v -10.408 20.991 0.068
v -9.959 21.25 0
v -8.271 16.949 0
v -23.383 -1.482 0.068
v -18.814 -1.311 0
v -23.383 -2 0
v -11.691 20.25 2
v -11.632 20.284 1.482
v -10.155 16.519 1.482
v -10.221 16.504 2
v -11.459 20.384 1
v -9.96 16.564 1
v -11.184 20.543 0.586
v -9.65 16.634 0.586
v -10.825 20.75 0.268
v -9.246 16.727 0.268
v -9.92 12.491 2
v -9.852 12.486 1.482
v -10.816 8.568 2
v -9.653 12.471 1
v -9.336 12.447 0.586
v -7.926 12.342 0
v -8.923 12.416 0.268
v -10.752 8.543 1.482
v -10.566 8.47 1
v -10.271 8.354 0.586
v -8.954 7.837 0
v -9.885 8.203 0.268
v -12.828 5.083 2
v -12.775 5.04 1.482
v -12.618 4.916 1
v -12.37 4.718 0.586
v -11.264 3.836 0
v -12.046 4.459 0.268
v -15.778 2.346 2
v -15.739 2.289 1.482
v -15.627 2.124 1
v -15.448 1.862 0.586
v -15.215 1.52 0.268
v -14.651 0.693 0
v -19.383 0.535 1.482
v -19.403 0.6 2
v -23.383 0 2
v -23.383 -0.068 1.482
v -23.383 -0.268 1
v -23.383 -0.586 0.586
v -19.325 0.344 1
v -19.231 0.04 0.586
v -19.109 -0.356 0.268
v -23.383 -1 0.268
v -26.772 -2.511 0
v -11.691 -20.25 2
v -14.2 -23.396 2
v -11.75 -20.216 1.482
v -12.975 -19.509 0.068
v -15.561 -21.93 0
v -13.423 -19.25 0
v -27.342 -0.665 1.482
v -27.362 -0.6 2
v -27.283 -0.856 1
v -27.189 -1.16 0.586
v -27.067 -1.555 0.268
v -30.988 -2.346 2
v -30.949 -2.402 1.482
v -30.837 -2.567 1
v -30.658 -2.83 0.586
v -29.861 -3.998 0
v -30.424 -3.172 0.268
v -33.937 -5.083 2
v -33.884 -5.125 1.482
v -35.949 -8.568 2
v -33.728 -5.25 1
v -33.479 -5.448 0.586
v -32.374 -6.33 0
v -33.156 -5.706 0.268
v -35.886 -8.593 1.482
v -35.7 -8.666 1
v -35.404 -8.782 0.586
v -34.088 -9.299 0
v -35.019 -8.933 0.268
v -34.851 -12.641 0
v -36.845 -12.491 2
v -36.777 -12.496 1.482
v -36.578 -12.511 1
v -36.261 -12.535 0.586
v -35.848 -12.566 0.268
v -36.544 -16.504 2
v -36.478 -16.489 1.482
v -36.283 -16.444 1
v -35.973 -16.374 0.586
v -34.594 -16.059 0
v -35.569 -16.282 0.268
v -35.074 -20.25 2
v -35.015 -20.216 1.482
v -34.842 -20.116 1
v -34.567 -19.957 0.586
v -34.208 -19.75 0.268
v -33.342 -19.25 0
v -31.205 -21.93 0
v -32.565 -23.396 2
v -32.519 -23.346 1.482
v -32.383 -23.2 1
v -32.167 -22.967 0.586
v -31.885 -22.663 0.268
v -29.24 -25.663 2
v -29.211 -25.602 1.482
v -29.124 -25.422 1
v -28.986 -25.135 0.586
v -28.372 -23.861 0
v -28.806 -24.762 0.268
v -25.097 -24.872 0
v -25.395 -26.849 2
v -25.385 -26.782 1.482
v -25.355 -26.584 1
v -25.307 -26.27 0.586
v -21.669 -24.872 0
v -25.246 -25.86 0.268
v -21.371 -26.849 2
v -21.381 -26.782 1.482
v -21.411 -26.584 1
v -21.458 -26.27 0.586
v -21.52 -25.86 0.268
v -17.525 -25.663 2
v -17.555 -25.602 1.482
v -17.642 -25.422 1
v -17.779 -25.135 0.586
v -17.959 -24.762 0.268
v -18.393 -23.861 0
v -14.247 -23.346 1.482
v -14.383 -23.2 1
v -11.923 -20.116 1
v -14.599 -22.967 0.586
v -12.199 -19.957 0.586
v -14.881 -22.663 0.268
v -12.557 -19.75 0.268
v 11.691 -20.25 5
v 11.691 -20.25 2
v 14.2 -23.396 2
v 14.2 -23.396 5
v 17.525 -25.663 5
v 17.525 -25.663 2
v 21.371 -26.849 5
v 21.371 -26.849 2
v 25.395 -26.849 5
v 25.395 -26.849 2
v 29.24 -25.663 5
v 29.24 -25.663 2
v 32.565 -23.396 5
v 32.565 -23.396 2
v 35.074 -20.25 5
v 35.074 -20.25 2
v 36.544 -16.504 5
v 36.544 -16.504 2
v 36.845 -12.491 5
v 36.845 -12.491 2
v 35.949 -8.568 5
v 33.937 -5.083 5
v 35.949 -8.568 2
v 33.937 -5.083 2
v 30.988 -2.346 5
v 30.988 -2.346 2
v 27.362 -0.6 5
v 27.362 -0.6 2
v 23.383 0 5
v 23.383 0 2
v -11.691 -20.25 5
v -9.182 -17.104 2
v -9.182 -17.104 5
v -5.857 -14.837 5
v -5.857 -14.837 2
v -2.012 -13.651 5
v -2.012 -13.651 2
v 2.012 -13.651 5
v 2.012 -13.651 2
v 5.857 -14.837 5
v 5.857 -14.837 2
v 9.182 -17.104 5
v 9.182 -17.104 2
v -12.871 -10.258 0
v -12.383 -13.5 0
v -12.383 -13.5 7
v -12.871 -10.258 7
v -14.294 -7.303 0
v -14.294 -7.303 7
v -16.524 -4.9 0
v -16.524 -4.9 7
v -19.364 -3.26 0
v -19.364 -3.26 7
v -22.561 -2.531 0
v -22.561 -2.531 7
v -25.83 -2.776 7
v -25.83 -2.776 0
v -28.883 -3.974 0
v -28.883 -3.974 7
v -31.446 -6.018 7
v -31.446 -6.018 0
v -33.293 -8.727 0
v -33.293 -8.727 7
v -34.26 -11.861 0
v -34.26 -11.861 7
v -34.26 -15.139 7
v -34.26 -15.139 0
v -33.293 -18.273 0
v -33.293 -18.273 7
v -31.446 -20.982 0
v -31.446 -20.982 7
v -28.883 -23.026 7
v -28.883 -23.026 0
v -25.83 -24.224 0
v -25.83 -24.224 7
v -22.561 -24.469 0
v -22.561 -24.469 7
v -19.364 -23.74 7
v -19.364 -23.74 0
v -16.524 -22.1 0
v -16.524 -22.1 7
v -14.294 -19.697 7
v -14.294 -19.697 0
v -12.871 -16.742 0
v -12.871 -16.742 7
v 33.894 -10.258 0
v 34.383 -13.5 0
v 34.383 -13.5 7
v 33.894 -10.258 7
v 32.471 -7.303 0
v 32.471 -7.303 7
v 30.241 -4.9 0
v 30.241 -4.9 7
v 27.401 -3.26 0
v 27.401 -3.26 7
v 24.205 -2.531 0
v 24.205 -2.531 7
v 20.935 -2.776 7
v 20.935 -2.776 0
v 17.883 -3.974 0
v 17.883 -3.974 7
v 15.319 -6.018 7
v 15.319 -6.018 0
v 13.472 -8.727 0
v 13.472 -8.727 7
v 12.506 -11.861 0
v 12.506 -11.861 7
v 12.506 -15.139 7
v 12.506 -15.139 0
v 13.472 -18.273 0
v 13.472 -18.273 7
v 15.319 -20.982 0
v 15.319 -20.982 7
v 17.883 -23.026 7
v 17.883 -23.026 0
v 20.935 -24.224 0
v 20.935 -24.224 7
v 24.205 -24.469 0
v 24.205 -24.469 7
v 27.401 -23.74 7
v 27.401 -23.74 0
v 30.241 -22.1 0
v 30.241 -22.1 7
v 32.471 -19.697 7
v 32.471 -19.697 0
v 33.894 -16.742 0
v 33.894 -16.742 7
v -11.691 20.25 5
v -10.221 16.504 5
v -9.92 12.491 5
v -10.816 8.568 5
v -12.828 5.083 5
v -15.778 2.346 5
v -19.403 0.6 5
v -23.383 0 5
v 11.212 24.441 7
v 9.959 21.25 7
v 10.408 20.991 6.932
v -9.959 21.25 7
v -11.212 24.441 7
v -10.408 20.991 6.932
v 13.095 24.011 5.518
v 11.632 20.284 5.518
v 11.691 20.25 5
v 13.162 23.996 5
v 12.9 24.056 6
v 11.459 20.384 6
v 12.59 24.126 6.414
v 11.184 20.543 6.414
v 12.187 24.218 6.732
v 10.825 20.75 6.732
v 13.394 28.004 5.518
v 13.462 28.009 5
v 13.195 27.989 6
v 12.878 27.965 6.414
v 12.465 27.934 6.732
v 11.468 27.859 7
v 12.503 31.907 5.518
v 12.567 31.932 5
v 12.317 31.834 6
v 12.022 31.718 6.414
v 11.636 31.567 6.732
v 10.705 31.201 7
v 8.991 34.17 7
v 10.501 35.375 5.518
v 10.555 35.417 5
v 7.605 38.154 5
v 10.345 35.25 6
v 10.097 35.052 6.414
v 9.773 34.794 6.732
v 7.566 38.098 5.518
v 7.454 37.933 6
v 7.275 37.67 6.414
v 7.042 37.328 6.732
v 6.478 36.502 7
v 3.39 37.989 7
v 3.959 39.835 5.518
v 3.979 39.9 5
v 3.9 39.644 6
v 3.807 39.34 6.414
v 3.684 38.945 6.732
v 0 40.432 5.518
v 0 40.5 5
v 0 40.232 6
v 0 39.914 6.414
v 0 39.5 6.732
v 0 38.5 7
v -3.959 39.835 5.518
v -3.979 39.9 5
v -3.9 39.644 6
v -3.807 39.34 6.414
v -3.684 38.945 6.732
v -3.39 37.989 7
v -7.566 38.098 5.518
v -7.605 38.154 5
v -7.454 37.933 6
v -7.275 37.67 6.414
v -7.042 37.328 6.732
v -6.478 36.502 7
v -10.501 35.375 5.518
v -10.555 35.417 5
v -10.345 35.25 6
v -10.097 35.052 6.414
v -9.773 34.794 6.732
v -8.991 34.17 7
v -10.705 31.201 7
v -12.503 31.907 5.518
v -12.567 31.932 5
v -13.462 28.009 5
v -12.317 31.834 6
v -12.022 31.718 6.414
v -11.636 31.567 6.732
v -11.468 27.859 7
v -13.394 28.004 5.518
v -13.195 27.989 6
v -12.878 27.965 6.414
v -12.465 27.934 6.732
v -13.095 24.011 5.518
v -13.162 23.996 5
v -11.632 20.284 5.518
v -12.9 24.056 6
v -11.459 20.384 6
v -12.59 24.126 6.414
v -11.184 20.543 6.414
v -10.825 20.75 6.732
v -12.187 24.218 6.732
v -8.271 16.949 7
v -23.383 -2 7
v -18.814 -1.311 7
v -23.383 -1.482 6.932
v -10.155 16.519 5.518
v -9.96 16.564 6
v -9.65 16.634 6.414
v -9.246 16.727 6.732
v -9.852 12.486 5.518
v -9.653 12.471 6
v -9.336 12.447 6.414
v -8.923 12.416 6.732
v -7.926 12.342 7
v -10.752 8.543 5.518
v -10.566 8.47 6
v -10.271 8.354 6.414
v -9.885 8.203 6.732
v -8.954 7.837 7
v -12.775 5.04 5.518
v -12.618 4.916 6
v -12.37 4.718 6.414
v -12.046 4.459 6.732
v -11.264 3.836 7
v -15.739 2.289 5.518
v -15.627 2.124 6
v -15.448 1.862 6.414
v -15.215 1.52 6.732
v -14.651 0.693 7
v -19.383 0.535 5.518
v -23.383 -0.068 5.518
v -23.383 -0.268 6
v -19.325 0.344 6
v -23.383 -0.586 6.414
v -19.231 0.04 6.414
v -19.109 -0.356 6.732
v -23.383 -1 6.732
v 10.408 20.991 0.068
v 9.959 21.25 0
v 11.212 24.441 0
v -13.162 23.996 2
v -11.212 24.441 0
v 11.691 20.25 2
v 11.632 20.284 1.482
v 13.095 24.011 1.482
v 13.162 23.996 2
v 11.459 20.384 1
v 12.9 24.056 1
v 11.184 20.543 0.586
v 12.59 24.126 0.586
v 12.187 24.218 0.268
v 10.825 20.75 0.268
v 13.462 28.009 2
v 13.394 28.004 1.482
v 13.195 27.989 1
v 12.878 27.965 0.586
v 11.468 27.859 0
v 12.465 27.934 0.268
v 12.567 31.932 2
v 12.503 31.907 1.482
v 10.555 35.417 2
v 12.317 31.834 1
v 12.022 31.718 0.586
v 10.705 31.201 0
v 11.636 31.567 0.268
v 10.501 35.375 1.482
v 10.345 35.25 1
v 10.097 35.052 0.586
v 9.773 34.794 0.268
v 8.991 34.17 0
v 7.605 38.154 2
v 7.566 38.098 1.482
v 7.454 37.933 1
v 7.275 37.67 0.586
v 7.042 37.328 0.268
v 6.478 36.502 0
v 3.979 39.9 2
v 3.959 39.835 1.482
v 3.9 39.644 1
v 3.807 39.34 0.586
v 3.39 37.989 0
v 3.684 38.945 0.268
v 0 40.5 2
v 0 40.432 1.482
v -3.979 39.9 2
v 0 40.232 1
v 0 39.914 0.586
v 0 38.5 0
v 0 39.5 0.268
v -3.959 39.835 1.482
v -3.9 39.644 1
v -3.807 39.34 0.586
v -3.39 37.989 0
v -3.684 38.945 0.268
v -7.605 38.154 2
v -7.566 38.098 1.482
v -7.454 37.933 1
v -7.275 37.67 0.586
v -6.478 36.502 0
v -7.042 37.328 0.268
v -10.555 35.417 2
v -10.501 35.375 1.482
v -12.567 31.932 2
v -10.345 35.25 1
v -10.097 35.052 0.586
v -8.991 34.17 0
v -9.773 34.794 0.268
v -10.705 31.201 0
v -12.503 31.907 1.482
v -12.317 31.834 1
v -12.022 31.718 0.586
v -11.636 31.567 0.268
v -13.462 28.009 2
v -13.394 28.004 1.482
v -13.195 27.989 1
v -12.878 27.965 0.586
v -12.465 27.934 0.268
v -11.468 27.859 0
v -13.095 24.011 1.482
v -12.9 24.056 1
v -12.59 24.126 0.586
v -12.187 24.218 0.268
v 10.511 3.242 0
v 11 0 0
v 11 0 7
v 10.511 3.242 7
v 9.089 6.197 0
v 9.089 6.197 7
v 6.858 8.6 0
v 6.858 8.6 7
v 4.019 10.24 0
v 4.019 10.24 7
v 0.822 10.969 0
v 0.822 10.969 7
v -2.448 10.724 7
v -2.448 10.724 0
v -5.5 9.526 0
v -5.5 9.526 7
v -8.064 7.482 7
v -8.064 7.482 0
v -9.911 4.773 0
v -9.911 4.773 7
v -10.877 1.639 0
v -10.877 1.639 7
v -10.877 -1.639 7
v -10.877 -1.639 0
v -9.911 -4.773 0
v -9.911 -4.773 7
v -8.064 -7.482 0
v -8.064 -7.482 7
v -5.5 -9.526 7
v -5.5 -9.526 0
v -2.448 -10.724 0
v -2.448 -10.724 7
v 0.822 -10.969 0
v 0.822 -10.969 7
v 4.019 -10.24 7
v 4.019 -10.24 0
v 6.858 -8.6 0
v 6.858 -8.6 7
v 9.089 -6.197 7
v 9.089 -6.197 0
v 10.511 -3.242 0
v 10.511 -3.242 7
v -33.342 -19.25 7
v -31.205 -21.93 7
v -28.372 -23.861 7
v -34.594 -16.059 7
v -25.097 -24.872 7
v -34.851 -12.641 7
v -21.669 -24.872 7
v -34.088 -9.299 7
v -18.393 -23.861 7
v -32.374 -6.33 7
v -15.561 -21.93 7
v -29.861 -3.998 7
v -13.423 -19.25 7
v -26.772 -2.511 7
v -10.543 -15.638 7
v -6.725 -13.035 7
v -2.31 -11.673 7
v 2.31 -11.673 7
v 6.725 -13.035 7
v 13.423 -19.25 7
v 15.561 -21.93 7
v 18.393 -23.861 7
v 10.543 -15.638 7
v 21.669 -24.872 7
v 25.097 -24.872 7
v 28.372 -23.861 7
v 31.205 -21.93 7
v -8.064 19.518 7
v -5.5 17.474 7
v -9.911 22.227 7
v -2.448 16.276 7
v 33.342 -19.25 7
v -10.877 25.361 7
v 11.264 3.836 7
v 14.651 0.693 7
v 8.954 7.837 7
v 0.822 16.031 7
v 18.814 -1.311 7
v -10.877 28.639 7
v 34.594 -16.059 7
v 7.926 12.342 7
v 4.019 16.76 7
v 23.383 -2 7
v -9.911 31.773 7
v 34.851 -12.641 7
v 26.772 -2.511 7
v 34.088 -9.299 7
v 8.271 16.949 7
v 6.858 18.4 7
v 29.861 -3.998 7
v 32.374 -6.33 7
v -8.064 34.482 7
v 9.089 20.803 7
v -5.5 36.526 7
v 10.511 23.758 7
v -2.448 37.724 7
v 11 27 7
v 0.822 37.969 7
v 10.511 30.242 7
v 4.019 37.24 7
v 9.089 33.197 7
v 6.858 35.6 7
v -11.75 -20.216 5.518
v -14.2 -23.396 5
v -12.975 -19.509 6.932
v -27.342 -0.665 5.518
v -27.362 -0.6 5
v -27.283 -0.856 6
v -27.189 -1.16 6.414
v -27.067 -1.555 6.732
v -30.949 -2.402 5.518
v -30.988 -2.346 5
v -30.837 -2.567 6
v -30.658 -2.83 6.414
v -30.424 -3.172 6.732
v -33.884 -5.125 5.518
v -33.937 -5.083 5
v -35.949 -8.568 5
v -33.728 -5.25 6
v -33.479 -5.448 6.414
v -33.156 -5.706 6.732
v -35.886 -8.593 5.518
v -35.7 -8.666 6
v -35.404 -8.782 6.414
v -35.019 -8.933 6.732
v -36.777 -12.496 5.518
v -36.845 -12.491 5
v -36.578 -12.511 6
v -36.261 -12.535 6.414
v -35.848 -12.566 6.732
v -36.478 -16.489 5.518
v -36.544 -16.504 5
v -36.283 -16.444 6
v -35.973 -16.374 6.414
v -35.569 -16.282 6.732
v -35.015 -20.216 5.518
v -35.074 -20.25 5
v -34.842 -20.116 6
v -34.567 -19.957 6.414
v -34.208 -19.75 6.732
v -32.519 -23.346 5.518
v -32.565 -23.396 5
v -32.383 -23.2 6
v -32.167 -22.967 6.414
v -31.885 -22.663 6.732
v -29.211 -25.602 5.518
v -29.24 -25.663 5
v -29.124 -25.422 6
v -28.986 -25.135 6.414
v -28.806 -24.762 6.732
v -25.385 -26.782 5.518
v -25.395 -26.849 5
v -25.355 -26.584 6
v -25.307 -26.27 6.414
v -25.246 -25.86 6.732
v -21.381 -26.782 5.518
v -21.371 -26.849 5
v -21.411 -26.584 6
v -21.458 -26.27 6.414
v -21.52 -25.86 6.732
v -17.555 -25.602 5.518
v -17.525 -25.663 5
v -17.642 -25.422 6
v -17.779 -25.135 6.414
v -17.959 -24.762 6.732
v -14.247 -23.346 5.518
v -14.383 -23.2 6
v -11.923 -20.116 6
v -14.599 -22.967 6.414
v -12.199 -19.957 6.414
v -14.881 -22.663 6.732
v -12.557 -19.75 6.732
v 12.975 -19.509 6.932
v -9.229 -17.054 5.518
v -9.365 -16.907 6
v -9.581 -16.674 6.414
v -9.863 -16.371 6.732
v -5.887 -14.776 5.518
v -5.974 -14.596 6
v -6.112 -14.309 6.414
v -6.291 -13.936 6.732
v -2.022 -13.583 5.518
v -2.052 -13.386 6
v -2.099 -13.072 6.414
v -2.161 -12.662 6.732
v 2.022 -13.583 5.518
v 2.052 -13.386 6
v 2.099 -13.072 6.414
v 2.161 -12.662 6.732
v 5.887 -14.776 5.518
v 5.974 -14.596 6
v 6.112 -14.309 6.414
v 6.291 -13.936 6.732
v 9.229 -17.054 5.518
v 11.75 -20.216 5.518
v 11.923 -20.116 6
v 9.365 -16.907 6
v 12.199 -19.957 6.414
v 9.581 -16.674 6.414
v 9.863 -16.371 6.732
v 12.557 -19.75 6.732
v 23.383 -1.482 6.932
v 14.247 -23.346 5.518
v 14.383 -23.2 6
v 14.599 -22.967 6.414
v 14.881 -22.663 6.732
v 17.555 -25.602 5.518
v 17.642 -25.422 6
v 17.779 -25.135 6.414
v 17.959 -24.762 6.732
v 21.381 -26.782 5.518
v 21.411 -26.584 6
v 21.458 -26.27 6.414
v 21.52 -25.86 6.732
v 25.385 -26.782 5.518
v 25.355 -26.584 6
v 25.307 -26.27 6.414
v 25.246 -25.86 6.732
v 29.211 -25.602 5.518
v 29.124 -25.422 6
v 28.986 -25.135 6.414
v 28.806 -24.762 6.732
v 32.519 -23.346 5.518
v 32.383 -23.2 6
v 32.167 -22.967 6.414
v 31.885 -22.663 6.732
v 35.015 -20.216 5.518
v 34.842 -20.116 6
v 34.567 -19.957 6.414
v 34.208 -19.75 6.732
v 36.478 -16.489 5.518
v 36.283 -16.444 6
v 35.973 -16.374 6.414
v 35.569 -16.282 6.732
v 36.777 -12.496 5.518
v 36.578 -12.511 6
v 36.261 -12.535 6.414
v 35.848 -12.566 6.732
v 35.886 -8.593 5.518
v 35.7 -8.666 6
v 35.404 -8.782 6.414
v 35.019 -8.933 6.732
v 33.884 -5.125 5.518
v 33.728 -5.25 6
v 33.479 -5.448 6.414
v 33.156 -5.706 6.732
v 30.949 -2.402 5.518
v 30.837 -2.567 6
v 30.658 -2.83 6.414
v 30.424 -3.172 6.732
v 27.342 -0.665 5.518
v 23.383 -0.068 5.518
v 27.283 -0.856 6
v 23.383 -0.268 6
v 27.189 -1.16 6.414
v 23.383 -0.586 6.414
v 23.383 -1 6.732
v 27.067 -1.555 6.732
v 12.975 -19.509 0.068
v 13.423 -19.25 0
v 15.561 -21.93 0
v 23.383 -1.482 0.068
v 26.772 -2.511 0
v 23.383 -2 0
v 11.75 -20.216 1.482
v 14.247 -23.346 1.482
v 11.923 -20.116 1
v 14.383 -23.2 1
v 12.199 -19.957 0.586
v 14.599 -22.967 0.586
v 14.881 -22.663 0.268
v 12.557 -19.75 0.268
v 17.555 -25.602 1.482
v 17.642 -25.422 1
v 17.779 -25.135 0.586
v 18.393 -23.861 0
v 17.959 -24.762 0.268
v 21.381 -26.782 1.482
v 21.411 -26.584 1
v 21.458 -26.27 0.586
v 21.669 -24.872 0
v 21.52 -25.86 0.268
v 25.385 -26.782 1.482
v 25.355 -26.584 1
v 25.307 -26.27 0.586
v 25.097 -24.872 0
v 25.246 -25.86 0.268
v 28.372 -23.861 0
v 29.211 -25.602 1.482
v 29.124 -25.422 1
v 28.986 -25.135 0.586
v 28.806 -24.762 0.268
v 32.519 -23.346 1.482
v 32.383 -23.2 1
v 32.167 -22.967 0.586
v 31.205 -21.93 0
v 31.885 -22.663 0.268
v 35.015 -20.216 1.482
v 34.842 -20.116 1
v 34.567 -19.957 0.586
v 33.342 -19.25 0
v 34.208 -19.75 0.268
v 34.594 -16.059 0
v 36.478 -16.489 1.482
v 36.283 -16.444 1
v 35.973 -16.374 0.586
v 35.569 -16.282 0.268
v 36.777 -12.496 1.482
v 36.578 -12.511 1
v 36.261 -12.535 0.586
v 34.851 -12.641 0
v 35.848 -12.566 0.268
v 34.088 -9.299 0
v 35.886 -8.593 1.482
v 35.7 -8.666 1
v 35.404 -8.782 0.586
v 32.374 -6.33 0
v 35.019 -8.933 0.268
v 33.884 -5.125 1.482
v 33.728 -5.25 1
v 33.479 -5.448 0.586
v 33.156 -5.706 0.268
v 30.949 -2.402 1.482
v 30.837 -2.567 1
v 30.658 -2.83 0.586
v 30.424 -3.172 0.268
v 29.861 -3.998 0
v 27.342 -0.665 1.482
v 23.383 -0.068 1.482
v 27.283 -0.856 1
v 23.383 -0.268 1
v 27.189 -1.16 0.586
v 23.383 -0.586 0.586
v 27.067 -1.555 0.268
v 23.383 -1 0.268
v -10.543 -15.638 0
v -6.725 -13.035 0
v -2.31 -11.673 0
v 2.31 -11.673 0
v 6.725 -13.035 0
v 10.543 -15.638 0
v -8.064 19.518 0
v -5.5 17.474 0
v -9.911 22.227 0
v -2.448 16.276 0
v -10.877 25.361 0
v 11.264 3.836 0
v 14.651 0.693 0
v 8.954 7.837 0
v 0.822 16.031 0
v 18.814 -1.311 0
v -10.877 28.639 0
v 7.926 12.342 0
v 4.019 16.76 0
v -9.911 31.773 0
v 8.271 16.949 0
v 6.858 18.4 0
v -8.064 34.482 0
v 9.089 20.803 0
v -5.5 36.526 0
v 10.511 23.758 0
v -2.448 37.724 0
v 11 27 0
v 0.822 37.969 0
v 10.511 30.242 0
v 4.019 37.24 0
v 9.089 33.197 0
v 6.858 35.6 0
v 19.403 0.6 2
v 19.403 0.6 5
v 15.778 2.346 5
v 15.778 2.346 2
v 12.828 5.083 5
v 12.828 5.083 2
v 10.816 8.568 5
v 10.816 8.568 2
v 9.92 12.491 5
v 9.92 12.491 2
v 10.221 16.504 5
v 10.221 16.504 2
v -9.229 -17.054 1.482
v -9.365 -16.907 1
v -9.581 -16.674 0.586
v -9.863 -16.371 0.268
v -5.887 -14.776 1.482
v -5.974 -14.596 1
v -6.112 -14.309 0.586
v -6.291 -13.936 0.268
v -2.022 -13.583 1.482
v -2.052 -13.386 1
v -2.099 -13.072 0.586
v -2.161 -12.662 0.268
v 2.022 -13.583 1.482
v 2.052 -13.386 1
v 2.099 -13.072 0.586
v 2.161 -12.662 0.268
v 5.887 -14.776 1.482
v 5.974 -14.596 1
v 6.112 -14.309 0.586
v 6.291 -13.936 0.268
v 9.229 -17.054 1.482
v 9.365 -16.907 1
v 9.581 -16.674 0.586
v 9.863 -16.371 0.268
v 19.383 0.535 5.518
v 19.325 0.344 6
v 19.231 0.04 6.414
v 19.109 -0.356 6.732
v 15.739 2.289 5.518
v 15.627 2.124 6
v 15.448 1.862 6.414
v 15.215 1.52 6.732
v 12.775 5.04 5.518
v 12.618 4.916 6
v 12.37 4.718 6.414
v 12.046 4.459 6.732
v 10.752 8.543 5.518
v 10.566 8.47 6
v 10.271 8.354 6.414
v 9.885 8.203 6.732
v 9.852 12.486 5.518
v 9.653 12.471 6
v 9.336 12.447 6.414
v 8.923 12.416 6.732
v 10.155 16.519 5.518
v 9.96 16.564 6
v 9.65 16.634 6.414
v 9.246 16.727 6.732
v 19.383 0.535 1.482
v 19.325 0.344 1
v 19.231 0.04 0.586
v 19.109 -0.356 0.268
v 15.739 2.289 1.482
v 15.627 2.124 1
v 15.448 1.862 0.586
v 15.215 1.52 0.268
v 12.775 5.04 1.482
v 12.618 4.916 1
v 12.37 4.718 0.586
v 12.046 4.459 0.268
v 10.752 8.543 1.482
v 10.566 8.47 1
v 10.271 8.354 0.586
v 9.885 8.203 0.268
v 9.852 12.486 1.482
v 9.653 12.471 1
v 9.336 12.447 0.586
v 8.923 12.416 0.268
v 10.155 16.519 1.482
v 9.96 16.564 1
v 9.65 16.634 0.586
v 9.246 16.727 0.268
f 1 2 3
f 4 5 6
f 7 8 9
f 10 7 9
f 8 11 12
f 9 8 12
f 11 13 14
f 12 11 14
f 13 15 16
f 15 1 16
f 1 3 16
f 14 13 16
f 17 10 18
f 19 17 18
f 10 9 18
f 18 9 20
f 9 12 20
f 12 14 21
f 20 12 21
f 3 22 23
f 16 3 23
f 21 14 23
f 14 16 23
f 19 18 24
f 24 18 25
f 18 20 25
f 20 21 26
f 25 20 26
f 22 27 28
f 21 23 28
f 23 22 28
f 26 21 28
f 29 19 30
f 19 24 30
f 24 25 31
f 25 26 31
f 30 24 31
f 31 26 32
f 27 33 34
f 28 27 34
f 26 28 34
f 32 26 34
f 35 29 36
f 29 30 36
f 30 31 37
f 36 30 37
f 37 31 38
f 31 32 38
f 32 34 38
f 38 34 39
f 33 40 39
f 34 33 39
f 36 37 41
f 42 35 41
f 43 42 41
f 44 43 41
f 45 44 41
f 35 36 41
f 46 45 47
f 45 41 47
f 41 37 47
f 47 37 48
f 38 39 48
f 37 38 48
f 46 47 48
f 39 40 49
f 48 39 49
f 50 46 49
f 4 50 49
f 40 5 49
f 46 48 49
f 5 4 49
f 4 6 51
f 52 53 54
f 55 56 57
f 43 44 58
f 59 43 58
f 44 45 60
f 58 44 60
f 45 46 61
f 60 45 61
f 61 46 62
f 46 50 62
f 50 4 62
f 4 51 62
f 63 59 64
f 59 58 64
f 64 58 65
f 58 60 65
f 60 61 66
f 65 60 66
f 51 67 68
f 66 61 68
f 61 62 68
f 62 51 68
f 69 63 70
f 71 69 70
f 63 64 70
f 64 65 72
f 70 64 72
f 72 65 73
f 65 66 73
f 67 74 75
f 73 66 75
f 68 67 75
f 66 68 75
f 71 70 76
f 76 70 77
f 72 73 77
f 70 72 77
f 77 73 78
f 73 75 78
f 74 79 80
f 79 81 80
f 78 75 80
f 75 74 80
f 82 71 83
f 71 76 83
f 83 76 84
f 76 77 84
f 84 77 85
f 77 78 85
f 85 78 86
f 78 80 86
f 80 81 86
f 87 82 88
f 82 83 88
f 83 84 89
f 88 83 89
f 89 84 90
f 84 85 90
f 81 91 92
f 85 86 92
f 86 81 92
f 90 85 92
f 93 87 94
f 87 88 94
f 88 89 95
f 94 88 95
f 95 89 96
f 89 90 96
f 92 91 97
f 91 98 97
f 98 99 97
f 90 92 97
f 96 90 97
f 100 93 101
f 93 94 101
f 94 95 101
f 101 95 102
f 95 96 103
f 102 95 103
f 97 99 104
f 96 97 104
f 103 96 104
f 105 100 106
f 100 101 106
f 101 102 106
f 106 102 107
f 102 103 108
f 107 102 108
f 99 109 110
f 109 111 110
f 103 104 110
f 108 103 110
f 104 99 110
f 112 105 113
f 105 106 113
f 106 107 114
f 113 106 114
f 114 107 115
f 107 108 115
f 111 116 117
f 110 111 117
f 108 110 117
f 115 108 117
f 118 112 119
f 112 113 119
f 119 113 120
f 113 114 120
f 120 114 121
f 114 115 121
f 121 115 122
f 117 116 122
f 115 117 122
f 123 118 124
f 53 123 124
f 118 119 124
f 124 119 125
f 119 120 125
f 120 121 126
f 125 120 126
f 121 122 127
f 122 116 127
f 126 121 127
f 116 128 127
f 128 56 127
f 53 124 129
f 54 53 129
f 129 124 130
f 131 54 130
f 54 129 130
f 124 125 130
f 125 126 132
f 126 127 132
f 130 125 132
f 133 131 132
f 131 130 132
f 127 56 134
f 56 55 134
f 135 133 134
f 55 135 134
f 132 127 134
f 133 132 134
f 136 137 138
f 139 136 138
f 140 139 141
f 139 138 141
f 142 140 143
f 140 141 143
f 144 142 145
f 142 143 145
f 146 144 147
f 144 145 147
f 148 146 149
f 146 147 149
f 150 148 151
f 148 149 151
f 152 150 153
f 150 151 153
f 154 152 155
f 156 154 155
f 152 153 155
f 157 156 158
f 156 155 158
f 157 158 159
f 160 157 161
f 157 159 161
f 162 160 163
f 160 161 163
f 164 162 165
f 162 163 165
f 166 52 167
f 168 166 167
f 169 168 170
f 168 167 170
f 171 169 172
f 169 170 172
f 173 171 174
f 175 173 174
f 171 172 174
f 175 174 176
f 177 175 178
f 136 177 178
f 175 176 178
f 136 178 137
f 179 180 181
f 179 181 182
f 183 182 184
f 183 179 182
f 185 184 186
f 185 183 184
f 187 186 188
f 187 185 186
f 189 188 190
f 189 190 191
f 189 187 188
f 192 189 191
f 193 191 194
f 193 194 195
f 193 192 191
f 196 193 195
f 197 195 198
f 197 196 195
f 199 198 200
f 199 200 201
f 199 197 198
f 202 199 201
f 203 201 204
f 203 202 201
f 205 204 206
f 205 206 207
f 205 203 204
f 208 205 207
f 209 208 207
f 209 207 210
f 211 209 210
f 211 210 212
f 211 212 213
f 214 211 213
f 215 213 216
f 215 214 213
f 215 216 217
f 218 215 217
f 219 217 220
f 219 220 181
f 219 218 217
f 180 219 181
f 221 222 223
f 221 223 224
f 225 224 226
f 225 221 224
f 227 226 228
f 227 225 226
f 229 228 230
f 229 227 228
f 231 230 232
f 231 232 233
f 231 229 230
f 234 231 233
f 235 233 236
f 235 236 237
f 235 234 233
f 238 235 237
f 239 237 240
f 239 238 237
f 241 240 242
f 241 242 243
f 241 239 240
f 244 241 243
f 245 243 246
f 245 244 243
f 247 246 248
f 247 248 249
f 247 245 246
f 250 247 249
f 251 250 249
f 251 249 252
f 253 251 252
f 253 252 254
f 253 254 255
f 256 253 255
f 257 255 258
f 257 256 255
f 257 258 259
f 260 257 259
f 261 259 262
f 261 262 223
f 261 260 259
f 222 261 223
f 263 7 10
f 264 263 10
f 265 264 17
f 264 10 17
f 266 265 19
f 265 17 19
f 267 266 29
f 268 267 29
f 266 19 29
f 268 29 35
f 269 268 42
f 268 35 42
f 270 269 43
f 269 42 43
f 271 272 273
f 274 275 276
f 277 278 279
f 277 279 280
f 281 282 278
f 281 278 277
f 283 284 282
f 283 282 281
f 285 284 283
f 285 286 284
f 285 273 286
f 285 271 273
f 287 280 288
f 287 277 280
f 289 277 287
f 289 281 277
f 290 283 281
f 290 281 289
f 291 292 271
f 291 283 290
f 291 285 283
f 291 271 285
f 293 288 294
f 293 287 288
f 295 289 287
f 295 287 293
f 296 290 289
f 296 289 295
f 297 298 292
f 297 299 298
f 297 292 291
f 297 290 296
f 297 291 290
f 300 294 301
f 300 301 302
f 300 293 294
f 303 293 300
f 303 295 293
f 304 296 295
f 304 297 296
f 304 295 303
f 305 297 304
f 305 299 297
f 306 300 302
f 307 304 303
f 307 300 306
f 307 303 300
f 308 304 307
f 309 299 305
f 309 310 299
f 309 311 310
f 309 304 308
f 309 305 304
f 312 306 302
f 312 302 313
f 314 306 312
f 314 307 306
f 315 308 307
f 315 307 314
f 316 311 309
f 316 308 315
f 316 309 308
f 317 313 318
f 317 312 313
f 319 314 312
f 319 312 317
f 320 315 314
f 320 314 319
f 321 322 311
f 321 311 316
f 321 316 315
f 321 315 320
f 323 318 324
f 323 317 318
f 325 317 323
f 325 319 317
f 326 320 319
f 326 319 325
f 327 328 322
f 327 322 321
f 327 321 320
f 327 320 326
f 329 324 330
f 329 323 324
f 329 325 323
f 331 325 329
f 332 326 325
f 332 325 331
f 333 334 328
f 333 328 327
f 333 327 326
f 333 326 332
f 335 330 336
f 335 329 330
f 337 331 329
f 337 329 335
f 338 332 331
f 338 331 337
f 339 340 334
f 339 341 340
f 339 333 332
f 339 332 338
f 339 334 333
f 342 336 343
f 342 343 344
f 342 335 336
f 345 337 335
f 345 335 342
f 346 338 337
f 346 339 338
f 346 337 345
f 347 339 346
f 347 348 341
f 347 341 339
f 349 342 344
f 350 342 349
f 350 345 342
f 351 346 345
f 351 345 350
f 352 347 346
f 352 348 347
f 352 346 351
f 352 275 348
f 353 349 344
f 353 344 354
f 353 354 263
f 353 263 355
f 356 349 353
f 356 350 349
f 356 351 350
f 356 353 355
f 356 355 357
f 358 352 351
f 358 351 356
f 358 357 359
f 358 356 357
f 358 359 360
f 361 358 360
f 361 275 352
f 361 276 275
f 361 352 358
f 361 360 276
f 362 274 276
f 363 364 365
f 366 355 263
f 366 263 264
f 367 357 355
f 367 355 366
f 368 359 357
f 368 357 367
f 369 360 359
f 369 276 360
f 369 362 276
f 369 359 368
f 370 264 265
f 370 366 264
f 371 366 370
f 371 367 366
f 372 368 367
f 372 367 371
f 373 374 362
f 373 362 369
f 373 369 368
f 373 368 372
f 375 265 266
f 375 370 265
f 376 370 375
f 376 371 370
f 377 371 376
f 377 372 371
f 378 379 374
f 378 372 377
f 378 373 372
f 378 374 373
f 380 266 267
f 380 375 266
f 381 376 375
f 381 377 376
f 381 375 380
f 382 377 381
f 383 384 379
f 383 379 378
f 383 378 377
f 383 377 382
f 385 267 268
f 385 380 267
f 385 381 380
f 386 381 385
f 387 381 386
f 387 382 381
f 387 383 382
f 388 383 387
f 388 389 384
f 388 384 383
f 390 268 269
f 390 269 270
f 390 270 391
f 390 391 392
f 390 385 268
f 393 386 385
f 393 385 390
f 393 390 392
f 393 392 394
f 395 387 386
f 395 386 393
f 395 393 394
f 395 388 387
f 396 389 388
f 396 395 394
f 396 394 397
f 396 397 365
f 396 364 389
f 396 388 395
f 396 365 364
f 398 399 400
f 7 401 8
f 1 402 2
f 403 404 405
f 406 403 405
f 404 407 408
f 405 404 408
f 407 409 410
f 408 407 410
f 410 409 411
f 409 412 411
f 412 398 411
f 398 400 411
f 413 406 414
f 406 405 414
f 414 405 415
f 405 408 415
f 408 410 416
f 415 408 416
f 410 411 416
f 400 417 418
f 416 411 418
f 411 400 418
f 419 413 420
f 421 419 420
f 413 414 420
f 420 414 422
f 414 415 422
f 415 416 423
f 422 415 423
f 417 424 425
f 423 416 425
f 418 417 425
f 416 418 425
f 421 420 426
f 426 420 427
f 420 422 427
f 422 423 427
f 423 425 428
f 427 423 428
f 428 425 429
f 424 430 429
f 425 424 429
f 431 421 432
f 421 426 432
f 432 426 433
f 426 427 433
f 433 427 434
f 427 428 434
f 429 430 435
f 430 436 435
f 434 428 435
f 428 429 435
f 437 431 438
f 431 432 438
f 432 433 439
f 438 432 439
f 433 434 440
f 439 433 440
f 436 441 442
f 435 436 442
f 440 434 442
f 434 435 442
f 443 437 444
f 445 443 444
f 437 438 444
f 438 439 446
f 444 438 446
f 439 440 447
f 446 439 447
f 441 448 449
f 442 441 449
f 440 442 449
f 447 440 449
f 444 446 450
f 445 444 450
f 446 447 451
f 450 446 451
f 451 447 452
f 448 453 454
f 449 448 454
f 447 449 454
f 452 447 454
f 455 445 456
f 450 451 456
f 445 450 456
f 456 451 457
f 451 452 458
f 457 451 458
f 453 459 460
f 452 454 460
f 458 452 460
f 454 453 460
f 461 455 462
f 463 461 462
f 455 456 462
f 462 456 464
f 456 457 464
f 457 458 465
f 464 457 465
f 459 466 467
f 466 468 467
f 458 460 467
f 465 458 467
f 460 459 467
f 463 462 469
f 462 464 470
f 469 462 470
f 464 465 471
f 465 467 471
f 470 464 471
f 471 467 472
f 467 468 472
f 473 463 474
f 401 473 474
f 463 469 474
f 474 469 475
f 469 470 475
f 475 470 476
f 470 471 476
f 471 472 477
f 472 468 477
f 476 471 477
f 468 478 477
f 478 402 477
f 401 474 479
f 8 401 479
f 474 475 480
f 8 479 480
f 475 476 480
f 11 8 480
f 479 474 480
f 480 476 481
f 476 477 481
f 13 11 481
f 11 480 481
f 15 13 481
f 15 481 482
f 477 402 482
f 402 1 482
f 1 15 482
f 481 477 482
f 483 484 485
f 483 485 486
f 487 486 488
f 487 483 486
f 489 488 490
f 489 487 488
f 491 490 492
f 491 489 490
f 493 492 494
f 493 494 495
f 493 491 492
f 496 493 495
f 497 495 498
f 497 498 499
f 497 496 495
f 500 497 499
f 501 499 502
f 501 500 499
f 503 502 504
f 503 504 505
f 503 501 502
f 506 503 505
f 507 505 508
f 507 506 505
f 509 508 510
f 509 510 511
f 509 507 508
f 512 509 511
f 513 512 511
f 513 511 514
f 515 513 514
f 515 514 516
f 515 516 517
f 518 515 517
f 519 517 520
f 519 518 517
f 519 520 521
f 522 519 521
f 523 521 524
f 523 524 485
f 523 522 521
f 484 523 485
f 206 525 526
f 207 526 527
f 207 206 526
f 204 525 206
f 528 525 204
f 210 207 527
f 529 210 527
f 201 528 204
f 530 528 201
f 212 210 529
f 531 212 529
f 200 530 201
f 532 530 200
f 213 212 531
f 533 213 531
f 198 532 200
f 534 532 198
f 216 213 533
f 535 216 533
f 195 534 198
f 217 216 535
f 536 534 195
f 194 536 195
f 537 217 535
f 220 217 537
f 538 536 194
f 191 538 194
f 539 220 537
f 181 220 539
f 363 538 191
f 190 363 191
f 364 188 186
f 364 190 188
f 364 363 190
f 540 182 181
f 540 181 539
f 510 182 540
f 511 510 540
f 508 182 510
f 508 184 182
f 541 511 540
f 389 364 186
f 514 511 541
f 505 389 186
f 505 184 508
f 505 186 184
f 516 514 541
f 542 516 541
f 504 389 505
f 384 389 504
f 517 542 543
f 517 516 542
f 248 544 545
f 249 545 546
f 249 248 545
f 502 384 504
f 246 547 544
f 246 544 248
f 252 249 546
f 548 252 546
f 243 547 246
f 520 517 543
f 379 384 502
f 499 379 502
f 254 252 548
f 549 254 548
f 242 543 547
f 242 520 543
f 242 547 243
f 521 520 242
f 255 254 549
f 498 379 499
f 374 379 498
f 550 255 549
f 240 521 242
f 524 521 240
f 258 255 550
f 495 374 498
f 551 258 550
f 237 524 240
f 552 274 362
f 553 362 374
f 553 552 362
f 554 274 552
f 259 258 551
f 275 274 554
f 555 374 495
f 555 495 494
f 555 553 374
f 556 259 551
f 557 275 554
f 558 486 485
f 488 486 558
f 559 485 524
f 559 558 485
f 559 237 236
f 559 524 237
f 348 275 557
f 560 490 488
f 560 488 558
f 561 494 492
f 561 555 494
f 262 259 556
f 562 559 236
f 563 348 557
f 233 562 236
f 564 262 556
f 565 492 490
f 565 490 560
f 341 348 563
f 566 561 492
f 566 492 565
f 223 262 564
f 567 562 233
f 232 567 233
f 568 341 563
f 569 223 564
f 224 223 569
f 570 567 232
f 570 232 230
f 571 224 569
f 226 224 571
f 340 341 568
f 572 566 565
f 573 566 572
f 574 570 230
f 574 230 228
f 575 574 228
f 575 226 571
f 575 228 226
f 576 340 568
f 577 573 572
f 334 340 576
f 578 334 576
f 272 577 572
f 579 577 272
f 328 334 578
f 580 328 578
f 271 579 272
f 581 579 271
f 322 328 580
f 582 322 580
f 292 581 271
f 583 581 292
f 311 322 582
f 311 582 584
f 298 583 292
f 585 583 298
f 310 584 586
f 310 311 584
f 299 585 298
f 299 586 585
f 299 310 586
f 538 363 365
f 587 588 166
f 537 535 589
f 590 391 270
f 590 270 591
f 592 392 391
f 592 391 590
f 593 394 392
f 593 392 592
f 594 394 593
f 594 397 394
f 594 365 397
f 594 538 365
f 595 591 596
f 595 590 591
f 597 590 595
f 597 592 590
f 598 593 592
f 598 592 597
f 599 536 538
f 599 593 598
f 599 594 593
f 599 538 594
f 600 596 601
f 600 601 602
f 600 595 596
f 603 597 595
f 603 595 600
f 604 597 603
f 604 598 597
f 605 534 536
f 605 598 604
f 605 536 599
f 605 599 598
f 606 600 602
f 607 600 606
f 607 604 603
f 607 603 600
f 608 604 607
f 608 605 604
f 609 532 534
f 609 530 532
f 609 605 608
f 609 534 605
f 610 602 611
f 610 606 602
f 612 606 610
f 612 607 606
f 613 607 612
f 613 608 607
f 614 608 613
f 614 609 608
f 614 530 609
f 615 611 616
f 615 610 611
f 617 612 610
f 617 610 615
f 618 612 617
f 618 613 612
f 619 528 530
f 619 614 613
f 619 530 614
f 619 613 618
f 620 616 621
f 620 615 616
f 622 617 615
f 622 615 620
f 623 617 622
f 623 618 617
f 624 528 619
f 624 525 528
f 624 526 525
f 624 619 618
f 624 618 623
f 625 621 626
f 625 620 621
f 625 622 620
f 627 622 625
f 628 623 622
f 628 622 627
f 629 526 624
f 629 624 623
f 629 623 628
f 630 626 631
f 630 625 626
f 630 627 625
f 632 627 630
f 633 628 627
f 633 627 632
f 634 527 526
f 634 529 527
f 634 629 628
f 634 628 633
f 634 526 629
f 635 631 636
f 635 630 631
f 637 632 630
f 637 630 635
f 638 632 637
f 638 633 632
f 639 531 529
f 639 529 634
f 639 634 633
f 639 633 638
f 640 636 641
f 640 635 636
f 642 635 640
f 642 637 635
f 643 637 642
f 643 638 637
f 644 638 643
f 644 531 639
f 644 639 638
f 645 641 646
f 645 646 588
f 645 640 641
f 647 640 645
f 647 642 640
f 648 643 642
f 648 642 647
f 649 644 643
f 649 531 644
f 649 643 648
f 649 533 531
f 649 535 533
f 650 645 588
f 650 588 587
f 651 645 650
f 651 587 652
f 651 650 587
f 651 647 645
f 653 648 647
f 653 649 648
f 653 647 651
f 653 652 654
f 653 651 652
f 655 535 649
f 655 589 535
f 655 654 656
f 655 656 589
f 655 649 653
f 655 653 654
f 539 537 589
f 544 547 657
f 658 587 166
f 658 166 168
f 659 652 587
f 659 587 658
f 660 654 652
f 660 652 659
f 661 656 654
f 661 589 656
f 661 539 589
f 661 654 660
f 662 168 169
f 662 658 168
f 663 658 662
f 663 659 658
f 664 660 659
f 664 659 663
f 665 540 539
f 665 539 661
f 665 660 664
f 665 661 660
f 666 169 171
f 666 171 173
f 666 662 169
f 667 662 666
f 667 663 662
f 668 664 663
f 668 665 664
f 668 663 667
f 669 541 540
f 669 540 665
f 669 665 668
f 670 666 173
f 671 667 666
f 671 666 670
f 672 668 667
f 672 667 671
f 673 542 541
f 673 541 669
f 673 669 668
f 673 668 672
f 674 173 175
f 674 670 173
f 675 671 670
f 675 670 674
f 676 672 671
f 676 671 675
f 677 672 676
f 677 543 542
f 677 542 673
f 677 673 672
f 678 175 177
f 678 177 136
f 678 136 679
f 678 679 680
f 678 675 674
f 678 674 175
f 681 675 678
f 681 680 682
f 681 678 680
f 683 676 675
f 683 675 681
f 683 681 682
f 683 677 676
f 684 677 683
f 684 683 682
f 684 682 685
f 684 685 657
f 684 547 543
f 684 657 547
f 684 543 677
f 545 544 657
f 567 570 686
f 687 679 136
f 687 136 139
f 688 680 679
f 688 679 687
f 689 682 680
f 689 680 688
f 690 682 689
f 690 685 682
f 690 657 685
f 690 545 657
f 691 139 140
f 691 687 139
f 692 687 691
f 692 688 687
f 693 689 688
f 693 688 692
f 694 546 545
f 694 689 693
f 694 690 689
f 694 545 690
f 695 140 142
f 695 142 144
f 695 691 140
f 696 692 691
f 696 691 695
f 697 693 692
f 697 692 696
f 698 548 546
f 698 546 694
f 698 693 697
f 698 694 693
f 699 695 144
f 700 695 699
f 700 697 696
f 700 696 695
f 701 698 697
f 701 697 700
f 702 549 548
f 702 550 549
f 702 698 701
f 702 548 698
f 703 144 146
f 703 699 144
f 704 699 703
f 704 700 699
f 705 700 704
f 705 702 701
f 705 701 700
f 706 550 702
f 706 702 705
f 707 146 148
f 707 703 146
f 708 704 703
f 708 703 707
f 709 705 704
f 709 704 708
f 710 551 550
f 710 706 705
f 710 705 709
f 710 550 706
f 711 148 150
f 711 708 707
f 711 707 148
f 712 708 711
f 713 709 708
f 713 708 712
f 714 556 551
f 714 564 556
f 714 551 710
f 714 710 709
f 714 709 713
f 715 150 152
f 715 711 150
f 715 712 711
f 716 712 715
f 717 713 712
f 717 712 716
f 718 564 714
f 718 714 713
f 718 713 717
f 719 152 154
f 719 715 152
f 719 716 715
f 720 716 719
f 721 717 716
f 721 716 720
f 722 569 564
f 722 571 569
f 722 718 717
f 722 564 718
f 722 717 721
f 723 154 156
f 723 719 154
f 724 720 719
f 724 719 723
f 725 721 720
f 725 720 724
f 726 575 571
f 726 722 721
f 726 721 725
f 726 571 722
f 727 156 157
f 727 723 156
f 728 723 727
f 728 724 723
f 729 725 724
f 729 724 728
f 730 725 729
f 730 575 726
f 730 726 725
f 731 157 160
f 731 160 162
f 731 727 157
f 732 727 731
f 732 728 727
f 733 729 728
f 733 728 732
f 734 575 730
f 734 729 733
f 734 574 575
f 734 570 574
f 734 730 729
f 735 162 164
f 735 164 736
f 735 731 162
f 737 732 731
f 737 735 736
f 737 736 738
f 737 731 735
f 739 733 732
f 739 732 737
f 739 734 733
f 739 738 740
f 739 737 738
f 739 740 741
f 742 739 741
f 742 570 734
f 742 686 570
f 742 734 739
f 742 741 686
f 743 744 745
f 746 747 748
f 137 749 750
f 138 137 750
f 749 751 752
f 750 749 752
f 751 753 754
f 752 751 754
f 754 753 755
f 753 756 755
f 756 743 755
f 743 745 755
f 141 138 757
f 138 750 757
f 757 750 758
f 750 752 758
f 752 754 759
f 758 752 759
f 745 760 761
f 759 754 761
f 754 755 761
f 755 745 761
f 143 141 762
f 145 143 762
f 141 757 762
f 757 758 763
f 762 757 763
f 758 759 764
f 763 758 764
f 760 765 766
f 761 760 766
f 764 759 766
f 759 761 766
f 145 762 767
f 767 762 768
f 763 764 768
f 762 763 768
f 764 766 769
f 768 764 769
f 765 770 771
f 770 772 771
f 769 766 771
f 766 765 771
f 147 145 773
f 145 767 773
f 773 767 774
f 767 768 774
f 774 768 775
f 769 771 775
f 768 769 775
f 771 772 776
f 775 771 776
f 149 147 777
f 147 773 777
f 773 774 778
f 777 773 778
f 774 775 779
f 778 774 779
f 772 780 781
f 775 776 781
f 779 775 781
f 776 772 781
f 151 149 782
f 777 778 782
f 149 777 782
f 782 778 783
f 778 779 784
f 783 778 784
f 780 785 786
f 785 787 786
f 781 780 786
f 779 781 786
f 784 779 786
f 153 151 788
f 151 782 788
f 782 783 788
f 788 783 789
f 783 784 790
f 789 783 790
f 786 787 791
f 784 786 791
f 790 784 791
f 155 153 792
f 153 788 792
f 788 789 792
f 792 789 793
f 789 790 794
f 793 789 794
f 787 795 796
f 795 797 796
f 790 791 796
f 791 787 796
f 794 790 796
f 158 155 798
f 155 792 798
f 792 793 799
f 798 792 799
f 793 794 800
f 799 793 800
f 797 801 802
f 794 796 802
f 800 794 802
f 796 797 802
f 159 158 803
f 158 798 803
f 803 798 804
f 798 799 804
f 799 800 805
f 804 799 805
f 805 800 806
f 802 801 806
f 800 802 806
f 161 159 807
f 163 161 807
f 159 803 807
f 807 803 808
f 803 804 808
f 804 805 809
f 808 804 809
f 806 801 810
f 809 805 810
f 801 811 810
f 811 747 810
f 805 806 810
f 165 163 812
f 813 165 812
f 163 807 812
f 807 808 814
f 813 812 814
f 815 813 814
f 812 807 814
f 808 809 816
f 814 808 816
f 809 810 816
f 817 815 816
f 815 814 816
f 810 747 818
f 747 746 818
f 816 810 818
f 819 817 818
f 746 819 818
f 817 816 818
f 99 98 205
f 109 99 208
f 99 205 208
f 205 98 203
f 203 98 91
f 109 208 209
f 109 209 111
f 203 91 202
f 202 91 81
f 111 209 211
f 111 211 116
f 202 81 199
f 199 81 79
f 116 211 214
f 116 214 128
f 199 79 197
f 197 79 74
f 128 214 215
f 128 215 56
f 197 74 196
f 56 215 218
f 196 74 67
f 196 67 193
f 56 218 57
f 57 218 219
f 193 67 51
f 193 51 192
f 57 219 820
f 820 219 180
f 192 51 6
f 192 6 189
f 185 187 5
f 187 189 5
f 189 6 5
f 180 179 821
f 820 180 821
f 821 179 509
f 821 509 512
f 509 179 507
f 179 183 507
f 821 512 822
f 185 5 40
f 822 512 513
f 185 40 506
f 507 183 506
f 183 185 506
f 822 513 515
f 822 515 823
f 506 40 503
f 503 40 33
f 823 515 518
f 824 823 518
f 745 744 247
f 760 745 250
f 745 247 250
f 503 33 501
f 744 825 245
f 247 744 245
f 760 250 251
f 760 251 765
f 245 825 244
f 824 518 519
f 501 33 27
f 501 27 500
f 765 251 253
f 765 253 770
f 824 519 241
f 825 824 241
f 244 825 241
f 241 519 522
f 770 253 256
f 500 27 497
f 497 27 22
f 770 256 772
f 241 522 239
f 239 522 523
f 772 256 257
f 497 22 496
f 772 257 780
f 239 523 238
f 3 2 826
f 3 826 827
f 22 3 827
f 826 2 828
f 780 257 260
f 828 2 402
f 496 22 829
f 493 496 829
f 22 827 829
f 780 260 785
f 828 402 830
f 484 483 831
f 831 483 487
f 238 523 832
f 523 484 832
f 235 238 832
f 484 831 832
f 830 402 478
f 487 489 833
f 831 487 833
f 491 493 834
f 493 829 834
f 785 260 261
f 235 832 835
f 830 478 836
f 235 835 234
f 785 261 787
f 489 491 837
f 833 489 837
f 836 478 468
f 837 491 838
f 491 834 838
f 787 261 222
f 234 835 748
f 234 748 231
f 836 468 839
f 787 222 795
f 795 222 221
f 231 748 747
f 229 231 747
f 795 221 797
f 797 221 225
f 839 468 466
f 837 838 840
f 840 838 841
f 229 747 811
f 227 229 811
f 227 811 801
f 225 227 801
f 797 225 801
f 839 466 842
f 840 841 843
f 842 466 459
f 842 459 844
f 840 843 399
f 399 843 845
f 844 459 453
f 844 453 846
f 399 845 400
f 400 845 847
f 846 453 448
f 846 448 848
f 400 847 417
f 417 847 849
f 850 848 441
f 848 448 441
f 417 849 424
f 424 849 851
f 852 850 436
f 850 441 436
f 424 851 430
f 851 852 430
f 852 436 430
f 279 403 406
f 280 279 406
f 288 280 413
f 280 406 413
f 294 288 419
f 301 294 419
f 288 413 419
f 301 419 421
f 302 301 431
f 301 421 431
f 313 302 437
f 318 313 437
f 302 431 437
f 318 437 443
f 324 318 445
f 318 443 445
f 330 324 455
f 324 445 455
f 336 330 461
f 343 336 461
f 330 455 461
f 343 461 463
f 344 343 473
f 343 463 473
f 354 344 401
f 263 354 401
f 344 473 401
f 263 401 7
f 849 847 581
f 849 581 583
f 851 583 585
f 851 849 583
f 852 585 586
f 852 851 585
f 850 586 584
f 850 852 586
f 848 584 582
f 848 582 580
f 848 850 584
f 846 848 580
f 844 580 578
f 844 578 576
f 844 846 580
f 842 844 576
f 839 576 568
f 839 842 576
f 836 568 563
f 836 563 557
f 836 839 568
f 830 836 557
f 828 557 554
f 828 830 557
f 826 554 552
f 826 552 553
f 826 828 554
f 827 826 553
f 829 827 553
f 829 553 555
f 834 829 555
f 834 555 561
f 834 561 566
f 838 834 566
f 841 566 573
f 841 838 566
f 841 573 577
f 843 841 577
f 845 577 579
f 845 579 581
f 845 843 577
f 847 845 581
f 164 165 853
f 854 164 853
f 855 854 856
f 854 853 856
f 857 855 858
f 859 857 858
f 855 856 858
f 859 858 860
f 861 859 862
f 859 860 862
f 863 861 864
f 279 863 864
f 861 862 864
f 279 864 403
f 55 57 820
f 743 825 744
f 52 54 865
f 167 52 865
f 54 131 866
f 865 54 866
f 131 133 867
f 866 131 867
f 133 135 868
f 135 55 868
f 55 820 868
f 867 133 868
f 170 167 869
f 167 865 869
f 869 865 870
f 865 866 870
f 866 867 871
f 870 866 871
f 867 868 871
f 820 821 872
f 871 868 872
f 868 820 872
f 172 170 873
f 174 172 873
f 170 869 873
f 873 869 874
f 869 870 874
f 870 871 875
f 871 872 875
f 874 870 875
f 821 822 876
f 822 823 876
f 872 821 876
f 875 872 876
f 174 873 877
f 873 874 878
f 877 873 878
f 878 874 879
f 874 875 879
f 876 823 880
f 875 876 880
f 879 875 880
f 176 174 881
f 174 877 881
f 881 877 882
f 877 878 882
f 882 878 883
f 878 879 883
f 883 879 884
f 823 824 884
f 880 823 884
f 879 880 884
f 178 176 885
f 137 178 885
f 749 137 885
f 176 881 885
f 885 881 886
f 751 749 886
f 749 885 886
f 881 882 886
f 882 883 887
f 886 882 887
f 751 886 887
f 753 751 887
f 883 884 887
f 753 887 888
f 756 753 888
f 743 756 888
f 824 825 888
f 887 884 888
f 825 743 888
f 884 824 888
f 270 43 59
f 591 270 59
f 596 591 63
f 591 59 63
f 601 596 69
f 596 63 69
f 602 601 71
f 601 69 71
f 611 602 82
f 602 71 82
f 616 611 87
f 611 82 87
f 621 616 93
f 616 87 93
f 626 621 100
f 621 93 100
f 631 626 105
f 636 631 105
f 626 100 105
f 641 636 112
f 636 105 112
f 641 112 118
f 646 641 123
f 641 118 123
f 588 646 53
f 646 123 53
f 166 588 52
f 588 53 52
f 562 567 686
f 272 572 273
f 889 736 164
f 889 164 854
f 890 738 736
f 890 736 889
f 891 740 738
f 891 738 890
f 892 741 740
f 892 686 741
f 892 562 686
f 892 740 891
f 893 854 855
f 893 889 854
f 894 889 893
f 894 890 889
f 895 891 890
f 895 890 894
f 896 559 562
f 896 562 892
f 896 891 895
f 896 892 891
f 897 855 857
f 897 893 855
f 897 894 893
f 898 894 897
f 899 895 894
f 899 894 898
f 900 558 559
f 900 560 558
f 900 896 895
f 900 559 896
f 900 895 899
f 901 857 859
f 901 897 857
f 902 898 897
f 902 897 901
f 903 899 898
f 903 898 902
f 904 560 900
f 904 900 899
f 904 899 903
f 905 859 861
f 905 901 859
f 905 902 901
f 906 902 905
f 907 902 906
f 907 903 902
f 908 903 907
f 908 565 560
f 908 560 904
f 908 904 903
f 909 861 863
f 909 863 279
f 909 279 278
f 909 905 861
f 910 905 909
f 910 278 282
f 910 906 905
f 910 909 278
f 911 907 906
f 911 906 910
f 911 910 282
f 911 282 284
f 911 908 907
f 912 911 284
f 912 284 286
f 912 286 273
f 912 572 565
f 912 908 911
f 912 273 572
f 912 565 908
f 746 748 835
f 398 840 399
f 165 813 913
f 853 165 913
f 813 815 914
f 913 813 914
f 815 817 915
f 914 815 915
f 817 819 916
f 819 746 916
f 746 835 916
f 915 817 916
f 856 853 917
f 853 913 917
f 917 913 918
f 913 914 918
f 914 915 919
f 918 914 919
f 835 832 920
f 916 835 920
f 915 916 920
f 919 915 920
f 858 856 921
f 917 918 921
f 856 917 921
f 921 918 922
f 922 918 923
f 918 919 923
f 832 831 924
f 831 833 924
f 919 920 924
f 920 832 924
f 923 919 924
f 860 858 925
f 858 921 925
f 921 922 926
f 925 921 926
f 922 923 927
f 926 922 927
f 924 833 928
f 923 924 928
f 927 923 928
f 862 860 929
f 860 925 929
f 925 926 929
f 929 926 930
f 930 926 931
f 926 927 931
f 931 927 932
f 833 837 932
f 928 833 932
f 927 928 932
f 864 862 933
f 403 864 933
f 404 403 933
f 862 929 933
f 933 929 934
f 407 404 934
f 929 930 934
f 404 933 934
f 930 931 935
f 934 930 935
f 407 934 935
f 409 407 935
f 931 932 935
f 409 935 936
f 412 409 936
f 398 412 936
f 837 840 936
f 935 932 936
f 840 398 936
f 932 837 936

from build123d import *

# Parameters (mm, degrees)
F0_R     = 11
F1_DEPTH = 7
F2_R     = 2
F3_R     = 2


with BuildPart() as f1:
    # F0 (on Top) → F1 (new body)
    with BuildSketch(Plane.XY):
        with BuildLine():
            ThreePointArc((23.382686, 0), (11.691343, 6.75), (11.691343, 20.25))
            ThreePointArc((11.691343, 20.25), (0, 40.5), (-11.691343, 20.25))
            ThreePointArc((-11.691343, 20.25), (-11.691343, 6.75), (-23.382686, 0))
            ThreePointArc((-23.382686, 0), (-35.074029, -20.25), (-11.691343, -20.25))
            ThreePointArc((-11.691343, -20.25), (0, -13.5), (11.691343, -20.25))
            ThreePointArc((11.691343, -20.25), (35.074029, -20.25), (23.382686, 0))
        make_face()
        with Locations((-23.382686, -13.5)):
            Circle(F0_R, mode=Mode.SUBTRACT)
        with Locations((23.382686, -13.5)):
            Circle(F0_R, mode=Mode.SUBTRACT)
        Circle(F0_R, mode=Mode.SUBTRACT)
        with Locations((0, 27)):
            Circle(F0_R, mode=Mode.SUBTRACT)
    extrude(amount=F1_DEPTH)

    # F2
    f2_edges = [f1.edges().sort_by_distance(p)[0] for p in [
        (-11.691343, 6.75, 7),
        (11.691343, 6.75, 7),
        (0, -13.5, 7),
    ]]
    fillet(f2_edges, radius=F2_R)

    # F3
    f3_edges = [f1.edges().sort_by_distance(p)[0] for p in [
        (11.691343, 6.75, 0),
    ]]
    fillet(f3_edges, radius=F3_R)


solid = f1.part
